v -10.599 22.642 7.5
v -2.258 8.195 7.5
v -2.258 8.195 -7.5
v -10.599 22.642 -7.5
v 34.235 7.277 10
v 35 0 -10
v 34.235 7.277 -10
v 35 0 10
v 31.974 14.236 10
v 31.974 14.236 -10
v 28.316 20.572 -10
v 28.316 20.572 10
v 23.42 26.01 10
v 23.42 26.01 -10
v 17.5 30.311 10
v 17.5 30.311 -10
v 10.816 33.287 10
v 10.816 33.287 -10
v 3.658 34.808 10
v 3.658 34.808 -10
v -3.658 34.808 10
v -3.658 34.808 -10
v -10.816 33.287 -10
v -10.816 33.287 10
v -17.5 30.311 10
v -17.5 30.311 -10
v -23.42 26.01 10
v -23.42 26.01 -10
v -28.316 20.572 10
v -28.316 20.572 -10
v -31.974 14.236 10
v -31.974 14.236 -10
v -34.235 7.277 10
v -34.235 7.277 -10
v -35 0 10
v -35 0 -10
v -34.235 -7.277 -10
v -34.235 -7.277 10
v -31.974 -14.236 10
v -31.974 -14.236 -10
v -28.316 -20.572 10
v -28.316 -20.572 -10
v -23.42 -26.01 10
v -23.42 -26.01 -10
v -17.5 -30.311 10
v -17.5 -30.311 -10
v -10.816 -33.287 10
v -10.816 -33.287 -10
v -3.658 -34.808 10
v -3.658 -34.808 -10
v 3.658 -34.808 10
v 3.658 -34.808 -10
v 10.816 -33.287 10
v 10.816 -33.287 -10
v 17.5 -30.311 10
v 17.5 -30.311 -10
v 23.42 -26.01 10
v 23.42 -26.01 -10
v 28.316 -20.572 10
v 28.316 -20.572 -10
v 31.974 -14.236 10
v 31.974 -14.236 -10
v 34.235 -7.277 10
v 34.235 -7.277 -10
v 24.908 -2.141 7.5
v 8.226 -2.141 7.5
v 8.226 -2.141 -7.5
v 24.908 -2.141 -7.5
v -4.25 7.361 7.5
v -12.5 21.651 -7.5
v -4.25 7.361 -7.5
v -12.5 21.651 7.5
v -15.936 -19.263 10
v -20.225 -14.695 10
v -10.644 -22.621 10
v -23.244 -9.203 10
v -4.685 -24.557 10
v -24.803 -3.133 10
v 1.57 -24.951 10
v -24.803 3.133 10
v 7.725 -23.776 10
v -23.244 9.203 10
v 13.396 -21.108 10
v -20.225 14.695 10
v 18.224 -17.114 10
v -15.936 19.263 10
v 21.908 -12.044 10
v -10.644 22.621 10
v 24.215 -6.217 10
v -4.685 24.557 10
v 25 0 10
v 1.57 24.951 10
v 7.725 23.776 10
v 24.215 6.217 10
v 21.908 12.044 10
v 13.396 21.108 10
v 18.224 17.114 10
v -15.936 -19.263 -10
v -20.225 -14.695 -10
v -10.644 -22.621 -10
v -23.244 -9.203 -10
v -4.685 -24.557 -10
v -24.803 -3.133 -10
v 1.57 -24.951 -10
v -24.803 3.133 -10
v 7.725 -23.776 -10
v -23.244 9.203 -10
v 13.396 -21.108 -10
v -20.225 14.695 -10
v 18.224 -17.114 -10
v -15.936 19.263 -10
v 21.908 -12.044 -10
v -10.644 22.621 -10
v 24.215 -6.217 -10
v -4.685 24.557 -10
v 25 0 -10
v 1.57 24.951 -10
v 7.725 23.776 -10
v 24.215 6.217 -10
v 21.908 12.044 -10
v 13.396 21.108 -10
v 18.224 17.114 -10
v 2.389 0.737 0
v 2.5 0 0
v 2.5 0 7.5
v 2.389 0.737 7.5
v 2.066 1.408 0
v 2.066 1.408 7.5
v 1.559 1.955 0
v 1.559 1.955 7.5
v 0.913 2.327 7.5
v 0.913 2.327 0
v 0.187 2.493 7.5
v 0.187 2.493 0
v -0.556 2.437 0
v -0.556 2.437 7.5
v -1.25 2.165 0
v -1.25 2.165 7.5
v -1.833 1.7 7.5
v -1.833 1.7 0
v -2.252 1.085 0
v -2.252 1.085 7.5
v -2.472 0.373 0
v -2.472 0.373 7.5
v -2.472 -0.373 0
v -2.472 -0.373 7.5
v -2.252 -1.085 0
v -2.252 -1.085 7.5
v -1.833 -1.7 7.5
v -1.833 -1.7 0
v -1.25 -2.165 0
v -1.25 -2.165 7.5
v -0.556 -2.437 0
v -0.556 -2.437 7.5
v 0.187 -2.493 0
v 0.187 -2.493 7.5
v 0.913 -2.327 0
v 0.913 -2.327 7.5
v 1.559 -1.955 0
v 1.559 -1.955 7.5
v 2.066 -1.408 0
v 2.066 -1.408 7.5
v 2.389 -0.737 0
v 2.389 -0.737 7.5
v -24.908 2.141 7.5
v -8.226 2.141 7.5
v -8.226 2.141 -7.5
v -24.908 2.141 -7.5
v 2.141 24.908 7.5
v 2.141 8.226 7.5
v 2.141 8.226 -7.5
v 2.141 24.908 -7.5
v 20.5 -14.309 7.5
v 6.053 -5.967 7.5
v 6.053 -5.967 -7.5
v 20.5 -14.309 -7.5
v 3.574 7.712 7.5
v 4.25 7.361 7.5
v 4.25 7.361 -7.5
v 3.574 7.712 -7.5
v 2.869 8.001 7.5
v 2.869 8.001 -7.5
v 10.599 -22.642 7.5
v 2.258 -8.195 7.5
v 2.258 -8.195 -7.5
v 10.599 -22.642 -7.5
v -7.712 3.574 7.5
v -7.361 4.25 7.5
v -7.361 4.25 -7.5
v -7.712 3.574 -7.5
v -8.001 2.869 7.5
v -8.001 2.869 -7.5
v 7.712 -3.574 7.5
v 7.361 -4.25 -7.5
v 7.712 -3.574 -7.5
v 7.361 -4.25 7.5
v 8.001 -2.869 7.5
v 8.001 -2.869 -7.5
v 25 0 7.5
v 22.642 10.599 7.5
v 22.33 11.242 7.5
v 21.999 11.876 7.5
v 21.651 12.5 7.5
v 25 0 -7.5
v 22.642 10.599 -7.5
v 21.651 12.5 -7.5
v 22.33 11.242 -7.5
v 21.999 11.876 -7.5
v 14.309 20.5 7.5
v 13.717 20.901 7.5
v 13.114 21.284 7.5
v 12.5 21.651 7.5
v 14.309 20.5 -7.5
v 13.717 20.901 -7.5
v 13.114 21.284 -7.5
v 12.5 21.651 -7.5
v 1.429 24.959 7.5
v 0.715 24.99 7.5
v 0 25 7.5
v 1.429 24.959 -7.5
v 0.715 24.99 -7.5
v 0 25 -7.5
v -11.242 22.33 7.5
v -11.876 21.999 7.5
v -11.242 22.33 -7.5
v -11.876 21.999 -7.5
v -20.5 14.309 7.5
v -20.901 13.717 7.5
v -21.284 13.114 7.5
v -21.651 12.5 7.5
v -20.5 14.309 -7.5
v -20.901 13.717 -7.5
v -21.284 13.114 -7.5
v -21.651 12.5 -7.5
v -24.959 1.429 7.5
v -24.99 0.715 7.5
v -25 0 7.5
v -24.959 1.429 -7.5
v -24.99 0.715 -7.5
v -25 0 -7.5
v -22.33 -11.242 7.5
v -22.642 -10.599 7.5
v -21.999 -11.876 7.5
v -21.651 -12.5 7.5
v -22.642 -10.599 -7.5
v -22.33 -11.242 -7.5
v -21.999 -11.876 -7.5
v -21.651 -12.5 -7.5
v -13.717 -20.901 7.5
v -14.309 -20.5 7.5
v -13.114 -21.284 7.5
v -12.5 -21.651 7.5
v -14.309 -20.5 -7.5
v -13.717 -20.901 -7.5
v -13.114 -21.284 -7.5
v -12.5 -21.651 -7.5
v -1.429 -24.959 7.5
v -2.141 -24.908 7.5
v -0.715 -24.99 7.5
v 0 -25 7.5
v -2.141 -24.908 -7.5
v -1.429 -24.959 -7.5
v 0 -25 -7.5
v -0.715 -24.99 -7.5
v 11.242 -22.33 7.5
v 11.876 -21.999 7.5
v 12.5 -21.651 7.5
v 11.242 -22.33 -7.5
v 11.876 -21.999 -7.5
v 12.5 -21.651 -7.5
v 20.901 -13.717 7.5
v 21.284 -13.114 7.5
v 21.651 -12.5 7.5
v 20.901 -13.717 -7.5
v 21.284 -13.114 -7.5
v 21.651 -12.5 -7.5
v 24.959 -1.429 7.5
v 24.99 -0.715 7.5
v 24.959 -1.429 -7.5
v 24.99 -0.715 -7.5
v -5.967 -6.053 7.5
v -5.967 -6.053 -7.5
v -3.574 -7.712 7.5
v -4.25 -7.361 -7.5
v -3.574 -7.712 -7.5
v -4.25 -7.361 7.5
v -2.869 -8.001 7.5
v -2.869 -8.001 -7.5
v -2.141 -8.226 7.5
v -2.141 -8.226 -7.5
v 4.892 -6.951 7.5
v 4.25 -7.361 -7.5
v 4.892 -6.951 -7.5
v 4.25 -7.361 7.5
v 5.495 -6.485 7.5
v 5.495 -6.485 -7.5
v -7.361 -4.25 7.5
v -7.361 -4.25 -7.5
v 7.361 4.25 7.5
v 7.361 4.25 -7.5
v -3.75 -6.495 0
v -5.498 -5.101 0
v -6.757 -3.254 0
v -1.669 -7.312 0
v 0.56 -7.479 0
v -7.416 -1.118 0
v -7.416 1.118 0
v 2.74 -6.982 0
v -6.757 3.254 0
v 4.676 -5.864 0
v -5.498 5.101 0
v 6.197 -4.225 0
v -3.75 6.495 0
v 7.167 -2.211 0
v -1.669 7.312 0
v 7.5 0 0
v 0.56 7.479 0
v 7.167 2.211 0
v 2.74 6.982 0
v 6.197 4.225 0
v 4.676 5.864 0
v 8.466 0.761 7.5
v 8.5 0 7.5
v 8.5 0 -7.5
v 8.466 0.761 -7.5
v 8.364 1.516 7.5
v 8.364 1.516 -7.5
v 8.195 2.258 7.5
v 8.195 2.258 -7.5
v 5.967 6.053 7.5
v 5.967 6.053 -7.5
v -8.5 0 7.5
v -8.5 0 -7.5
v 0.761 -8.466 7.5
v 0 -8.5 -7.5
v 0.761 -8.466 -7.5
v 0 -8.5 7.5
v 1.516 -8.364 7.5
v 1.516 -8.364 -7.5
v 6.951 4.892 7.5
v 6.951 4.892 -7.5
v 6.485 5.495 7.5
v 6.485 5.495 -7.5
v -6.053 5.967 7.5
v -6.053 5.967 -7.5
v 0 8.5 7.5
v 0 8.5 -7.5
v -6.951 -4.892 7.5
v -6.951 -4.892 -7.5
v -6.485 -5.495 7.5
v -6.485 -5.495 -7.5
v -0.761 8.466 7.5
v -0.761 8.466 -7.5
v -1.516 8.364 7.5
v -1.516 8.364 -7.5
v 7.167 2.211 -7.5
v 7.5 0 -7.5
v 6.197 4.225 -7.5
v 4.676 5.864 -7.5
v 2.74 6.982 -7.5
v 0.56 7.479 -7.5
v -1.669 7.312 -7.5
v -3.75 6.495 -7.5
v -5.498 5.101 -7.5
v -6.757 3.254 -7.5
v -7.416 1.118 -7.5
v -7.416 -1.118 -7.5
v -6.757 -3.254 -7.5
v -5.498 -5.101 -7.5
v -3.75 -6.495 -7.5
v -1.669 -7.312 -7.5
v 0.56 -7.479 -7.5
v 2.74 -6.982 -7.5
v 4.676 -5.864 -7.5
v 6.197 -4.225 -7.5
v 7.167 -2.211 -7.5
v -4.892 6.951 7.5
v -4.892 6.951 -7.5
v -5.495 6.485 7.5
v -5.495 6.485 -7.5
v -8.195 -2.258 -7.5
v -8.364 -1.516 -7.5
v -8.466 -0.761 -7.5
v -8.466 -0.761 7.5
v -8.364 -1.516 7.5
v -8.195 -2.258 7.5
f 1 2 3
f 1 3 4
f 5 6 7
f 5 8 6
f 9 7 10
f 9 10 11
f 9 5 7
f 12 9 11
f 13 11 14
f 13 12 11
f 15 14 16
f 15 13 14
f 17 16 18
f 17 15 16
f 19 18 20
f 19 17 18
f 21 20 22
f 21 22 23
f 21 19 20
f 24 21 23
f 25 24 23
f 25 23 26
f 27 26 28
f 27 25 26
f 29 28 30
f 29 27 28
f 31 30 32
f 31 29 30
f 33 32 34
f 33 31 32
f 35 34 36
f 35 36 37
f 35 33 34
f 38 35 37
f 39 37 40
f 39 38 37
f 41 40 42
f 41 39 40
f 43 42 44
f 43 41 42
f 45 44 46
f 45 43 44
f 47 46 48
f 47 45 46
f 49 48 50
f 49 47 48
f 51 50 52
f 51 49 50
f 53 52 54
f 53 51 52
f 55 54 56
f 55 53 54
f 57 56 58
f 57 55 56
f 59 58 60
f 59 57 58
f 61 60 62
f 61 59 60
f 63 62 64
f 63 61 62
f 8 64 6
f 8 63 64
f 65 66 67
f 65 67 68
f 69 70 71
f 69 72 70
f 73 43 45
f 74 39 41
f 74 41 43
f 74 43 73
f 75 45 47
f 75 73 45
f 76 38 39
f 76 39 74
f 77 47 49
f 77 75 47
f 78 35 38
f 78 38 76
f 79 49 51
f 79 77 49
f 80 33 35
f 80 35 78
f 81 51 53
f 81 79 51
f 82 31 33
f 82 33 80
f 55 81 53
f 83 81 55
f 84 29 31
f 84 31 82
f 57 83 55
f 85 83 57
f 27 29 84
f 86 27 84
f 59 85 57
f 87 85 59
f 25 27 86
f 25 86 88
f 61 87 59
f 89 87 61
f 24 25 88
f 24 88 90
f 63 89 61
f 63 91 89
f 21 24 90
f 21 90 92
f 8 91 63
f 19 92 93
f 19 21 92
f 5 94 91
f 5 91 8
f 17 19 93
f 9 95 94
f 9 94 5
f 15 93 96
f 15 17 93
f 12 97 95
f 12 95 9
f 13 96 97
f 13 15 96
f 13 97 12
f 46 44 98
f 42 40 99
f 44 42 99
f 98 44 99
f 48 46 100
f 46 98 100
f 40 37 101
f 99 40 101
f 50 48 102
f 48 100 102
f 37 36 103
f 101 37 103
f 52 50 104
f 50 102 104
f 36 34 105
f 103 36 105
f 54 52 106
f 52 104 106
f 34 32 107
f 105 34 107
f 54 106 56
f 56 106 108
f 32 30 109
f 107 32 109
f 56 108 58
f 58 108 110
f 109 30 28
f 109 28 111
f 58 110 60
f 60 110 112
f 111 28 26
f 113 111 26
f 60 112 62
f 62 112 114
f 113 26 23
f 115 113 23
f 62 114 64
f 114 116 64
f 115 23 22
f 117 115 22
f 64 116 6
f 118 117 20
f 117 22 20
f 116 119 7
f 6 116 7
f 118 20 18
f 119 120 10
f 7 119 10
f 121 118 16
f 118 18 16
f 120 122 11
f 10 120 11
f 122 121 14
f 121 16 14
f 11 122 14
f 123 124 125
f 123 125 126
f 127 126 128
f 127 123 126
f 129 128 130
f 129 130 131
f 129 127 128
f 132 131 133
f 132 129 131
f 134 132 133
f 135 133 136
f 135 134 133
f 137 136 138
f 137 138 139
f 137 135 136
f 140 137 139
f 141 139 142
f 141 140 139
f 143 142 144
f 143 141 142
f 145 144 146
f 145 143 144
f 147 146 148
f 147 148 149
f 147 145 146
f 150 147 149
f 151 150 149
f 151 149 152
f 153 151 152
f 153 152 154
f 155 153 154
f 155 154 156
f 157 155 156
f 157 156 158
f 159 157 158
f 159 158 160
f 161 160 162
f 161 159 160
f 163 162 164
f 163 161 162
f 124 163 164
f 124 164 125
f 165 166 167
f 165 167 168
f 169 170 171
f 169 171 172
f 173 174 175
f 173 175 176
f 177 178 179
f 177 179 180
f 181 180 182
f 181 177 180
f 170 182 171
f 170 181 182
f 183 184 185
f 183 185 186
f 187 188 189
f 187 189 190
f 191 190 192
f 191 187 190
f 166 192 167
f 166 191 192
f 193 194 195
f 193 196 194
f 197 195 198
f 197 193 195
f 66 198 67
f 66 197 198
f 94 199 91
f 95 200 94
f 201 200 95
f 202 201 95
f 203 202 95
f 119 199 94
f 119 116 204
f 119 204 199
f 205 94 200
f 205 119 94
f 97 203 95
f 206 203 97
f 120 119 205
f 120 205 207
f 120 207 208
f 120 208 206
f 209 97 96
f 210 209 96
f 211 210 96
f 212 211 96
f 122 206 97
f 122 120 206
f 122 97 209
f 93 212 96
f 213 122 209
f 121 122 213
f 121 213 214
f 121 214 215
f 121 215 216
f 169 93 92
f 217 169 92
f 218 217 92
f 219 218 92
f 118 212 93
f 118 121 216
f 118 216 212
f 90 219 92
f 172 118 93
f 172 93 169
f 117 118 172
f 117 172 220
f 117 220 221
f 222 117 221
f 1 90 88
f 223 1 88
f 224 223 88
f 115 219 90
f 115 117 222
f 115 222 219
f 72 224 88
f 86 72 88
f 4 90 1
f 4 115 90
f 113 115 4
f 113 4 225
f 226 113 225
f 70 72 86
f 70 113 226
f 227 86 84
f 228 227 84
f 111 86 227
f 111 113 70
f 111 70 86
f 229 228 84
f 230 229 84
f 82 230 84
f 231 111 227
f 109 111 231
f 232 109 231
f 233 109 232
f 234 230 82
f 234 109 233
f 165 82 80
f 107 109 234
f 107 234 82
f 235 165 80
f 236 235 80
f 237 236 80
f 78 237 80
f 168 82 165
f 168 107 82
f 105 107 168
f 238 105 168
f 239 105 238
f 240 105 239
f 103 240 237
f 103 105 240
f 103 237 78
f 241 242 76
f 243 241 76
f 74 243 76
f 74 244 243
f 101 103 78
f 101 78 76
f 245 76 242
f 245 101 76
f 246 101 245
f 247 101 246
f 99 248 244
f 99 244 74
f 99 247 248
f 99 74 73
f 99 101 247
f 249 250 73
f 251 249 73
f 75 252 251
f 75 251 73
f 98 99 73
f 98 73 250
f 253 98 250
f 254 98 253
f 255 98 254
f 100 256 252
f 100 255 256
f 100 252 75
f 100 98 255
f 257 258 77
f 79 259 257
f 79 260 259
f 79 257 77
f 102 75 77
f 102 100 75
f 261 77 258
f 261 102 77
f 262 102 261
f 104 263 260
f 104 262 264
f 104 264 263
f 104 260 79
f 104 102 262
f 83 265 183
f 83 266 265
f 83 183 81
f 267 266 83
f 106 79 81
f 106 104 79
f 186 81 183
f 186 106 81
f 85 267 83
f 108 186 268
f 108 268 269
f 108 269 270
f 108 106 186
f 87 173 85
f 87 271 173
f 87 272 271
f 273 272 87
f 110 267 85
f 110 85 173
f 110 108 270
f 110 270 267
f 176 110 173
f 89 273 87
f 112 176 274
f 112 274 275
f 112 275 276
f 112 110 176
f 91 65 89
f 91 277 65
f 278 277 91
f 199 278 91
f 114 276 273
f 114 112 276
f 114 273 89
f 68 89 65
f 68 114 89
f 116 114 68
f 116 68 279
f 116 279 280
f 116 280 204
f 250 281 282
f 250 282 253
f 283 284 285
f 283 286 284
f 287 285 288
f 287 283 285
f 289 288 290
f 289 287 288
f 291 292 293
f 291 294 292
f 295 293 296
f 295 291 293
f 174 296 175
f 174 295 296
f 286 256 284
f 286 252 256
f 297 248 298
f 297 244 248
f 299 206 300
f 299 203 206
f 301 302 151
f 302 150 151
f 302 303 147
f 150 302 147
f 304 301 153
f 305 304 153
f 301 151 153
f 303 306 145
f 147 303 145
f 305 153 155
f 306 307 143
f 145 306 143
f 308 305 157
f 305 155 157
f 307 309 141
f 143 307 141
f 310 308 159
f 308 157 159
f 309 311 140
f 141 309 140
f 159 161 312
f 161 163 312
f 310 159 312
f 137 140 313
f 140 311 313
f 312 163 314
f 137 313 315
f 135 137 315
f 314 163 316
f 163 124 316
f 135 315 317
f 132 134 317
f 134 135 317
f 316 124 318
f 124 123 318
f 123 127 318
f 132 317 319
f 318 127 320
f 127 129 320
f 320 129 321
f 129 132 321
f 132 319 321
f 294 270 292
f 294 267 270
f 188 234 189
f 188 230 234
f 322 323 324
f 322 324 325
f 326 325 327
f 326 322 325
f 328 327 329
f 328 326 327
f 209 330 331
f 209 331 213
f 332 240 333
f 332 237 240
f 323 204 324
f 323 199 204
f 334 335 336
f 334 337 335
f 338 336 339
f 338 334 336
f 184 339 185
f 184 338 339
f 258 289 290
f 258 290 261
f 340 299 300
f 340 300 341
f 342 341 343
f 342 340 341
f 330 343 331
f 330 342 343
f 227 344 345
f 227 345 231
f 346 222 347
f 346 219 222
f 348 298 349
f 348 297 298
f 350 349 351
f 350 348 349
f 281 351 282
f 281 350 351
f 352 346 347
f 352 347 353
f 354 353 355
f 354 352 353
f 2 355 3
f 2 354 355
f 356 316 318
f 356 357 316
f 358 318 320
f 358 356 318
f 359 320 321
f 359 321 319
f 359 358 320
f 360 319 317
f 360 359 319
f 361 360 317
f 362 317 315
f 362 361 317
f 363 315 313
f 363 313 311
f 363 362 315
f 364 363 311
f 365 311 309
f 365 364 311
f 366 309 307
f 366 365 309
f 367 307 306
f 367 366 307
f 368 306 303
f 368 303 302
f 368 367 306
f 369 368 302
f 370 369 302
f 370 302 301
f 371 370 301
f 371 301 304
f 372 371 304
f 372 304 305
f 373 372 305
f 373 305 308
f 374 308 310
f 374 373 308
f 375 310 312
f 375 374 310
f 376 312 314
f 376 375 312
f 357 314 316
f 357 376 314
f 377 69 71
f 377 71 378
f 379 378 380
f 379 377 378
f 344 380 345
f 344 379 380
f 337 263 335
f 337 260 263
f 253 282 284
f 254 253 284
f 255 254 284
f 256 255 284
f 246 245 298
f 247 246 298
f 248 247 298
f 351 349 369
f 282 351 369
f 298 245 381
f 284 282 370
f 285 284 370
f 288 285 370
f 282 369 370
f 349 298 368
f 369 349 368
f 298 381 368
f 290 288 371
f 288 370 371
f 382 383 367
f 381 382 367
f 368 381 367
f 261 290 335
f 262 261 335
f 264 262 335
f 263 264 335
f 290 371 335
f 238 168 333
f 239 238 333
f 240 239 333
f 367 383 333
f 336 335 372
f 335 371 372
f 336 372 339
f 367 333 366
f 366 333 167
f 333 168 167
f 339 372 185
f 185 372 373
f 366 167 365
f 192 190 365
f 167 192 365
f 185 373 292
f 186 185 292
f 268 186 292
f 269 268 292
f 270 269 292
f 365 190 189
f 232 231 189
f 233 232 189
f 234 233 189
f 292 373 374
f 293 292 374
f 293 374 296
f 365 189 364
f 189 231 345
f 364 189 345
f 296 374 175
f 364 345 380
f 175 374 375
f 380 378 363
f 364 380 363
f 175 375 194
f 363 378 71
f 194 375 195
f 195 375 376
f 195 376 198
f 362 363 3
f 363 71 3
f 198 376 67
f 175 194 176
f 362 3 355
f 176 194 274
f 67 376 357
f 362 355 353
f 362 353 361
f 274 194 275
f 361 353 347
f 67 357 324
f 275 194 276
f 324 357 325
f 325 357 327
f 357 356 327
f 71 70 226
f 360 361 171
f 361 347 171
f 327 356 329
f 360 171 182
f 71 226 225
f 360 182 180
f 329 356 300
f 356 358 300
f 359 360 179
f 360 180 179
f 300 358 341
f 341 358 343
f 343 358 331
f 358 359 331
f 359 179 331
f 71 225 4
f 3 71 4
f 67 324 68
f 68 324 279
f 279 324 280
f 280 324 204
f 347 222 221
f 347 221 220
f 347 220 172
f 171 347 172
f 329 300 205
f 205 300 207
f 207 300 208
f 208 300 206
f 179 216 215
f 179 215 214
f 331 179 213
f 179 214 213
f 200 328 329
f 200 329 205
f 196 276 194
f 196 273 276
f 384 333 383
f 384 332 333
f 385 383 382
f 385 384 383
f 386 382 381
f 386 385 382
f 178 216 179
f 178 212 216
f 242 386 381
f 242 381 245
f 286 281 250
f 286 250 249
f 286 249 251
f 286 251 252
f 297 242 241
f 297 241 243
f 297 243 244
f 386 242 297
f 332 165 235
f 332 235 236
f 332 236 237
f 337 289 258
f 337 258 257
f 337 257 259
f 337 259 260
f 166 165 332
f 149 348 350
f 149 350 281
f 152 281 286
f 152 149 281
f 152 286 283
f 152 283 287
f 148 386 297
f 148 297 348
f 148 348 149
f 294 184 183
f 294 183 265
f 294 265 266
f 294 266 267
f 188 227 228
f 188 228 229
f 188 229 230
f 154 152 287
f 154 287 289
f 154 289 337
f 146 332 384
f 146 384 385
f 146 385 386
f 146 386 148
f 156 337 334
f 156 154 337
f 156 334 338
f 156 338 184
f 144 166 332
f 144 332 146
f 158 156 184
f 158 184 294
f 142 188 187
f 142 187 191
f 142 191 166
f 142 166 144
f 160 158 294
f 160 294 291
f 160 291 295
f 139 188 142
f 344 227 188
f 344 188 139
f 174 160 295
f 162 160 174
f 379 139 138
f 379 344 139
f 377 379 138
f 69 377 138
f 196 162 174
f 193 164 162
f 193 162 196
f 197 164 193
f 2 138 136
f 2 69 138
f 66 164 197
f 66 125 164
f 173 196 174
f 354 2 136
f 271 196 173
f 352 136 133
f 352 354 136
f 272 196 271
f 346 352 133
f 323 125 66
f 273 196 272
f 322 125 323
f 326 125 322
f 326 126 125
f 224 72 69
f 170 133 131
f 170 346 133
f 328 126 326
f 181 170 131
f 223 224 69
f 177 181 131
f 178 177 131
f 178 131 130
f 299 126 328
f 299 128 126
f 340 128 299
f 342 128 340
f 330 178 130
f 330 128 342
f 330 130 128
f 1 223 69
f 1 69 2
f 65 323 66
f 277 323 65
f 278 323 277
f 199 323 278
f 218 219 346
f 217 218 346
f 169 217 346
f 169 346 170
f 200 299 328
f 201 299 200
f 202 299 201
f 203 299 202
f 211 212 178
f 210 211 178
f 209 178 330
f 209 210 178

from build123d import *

# Parameters (mm, degrees)
BOSS_EXTRUDE1_DEPTH    = 7.5
BOSS_EXTRUDE1_2_DEPTH  = 7.5
BOSS_EXTRUDE1_3_DEPTH  = 7.5
BOSS_EXTRUDE1_4_DEPTH  = 7.5
BOSS_EXTRUDE1_5_DEPTH  = 7.5
BOSS_EXTRUDE1_6_DEPTH  = 7.5
BOSS_EXTRUDE1_7_DEPTH  = 7.5
BOSS_EXTRUDE1_8_DEPTH  = 7.5
BOSS_EXTRUDE1_9_DEPTH  = 7.5
BOSS_EXTRUDE1_10_DEPTH = 7.5
BOSS_EXTRUDE1_11_DEPTH = 7.5
BOSS_EXTRUDE1_12_DEPTH = 7.5
SKETCH1_3_R            = 27
SKETCH1_3_R_2          = 25
BOSS_EXTRUDE2_DEPTH    = 10
SKETCH1_4_R            = 8.5
SKETCH1_4_R_2          = 7.5
BOSS_EXTRUDE3_DEPTH    = 7.5
SKETCH1_5_R            = 35
SKETCH1_5_R_2          = 27
BOSS_EXTRUDE4_DEPTH    = 10
SKETCH1_6_R            = 7.5
SKETCH1_6_R_2          = 2.5
BOSS_EXTRUDE5_DEPTH    = 7.5


with BuildPart() as part:
    # Sketch1 → Boss-Extrude1 (new, symmetric)
    with BuildSketch(Plane.XY):
        with BuildLine():
            Line((-25, 0), (-8.5, 0))
            ThreePointArc((-8.5, 0), (-8.43117662, 1.079472466), (-8.225820987, 2.141464239))
            Line((-8.225820987, 2.141464239), (-24.908113757, 2.141464239))
            ThreePointArc((-24.908113757, 2.141464239), (-24.977017876, 1.071717333), (-25, 0))
        make_face()
    extrude(amount=BOSS_EXTRUDE1_DEPTH, both=True)



with BuildPart() as body_2:
    # Sketch1 → Boss-Extrude1 2 (new, symmetric)
    with BuildSketch(Plane.XY):
        with BuildLine():
            ThreePointArc((-7.361215932, -4.25), (-7.84134937, -3.280737732), (-8.194502061, -2.258348061))
            Line((-8.194502061, -2.258348061), (-22.641791393, -10.599494446))
            ThreePointArc((-22.641791393, -10.599494446), (-22.166590658, -11.560374502), (-21.650635095, -12.5))
            Line((-21.650635095, -12.5), (-7.361215932, -4.25))
        make_face()
    extrude(amount=BOSS_EXTRUDE1_2_DEPTH, both=True)


with BuildPart() as body_3:
    # Sketch1 → Boss-Extrude1 3 (new, symmetric)
    with BuildSketch(Plane.XY):
        with BuildLine():
            Line((-21.650635095, 12.5), (-7.361215932, 4.25))
            ThreePointArc((-7.361215932, 4.25), (-6.761876904, 5.150438888), (-6.053037822, 5.967472926))
            Line((-6.053037822, 5.967472926), (-20.500327154, 14.308619311))
            ThreePointArc((-20.500327154, 14.308619311), (-21.094873324, 13.416643374), (-21.650635095, 12.5))
        make_face()
    extrude(amount=BOSS_EXTRUDE1_3_DEPTH, both=True)


with BuildPart() as body_4:
    # Sketch1 → Boss-Extrude1 4 (new, symmetric)
    with BuildSketch(Plane.XY):
        with BuildLine():
            ThreePointArc((-4.25, -7.361215932), (-5.150438888, -6.761876904), (-5.967472926, -6.053037822))
            Line((-5.967472926, -6.053037822), (-14.308619311, -20.500327154))
            ThreePointArc((-14.308619311, -20.500327154), (-13.416643374, -21.094873324), (-12.5, -21.650635095))
            Line((-12.5, -21.650635095), (-4.25, -7.361215932))
        make_face()
    extrude(amount=BOSS_EXTRUDE1_4_DEPTH, both=True)


with BuildPart() as body_5:
    # Sketch1 → Boss-Extrude1 5 (new, symmetric)
    with BuildSketch(Plane.XY):
        with BuildLine():
            Line((-12.5, 21.650635095), (-4.25, 7.361215932))
            ThreePointArc((-4.25, 7.361215932), (-3.280737732, 7.84134937), (-2.258348061, 8.194502061))
            Line((-2.258348061, 8.194502061), (-10.599494446, 22.641791393))
            ThreePointArc((-10.599494446, 22.641791393), (-11.560374502, 22.166590658), (-12.5, 21.650635095))
        make_face()
    extrude(amount=BOSS_EXTRUDE1_5_DEPTH, both=True)


with BuildPart() as body_6:
    # Sketch1 → Boss-Extrude1 6 (new, symmetric)
    with BuildSketch(Plane.XY):
        with BuildLine():
            ThreePointArc((0, -8.5), (-1.079472466, -8.43117662), (-2.141464239, -8.225820987))
            Line((-2.141464239, -8.225820987), (-2.141464239, -24.908113757))
            ThreePointArc((-2.141464239, -24.908113757), (-1.071717333, -24.977017876), (0, -25))
            Line((0, -25), (0, -8.5))
        make_face()
    extrude(amount=BOSS_EXTRUDE1_6_DEPTH, both=True)


with BuildPart() as body_7:
    # Sketch1 → Boss-Extrude1 7 (new, symmetric)
    with BuildSketch(Plane.XY):
        with BuildLine():
            Line((0, 25), (0, 8.5))
            ThreePointArc((0, 8.5), (1.079472466, 8.43117662), (2.141464239, 8.225820987))
            Line((2.141464239, 8.225820987), (2.141464239, 24.908113757))
            ThreePointArc((2.141464239, 24.908113757), (1.071717333, 24.977017876), (0, 25))
        make_face()
    extrude(amount=BOSS_EXTRUDE1_7_DEPTH, both=True)


with BuildPart() as body_8:
    # Sketch1 → Boss-Extrude1 8 (new, symmetric)
    with BuildSketch(Plane.XY):
        with BuildLine():
            ThreePointArc((4.25, -7.361215932), (3.280737732, -7.84134937), (2.258348061, -8.194502061))
            Line((2.258348061, -8.194502061), (10.599494446, -22.641791393))
            ThreePointArc((10.599494446, -22.641791393), (11.560374502, -22.166590658), (12.5, -21.650635095))
            Line((12.5, -21.650635095), (4.25, -7.361215932))
        make_face()
    extrude(amount=BOSS_EXTRUDE1_8_DEPTH, both=True)


with BuildPart() as body_9:
    # Sketch1 → Boss-Extrude1 9 (new, symmetric)
    with BuildSketch(Plane.XY):
        with BuildLine():
            Line((12.5, 21.650635095), (4.25, 7.361215932))
            ThreePointArc((4.25, 7.361215932), (5.150438888, 6.761876904), (5.967472926, 6.053037822))
            Line((5.967472926, 6.053037822), (14.308619311, 20.500327154))
            ThreePointArc((14.308619311, 20.500327154), (13.416643374, 21.094873324), (12.5, 21.650635095))
        make_face()
    extrude(amount=BOSS_EXTRUDE1_9_DEPTH, both=True)


with BuildPart() as body_10:
    # Sketch1 → Boss-Extrude1 10 (new, symmetric)
    with BuildSketch(Plane.XY):
        with BuildLine():
            ThreePointArc((7.361215932, -4.25), (6.761876904, -5.150438888), (6.053037822, -5.967472926))
            Line((6.053037822, -5.967472926), (20.500327154, -14.308619311))
            ThreePointArc((20.500327154, -14.308619311), (21.094873324, -13.416643374), (21.650635095, -12.5))
            Line((21.650635095, -12.5), (7.361215932, -4.25))
        make_face()
    extrude(amount=BOSS_EXTRUDE1_10_DEPTH, both=True)


with BuildPart() as body_11:
    # Sketch1 → Boss-Extrude1 11 (new, symmetric)
    with BuildSketch(Plane.XY):
        with BuildLine():
            Line((21.650635095, 12.5), (7.361215932, 4.25))
            ThreePointArc((7.361215932, 4.25), (7.84134937, 3.280737732), (8.194502061, 2.258348061))
            Line((8.194502061, 2.258348061), (22.641791393, 10.599494446))
            ThreePointArc((22.641791393, 10.599494446), (22.166590658, 11.560374502), (21.650635095, 12.5))
        make_face()
    extrude(amount=BOSS_EXTRUDE1_11_DEPTH, both=True)


with BuildPart() as body_12:
    # Sketch1 → Boss-Extrude1 12 (new, symmetric)
    with BuildSketch(Plane.XY):
        with BuildLine():
            ThreePointArc((8.5, 0), (8.43117662, -1.079472466), (8.225820987, -2.141464239))
            Line((8.225820987, -2.141464239), (24.908113757, -2.141464239))
            ThreePointArc((24.908113757, -2.141464239), (24.977017876, -1.071717333), (25, 0))
            Line((25, 0), (8.5, 0))
        make_face()
    extrude(amount=BOSS_EXTRUDE1_12_DEPTH, both=True)


with BuildPart() as part_1:
    add(part.part)

    add(body_2.part)  # Boss-Extrude2 merges body 2

    add(body_3.part)  # Boss-Extrude2 merges body 3

    add(body_4.part)  # Boss-Extrude2 merges body 4

    add(body_5.part)  # Boss-Extrude2 merges body 5

    add(body_6.part)  # Boss-Extrude2 merges body 6

    add(body_7.part)  # Boss-Extrude2 merges body 7

    add(body_8.part)  # Boss-Extrude2 merges body 8

    add(body_9.part)  # Boss-Extrude2 merges body 9

    add(body_10.part)  # Boss-Extrude2 merges body 10

    add(body_11.part)  # Boss-Extrude2 merges body 11

    add(body_12.part)  # Boss-Extrude2 merges body 12
    # Sketch1_3 → Boss-Extrude2 (add, symmetric)
    with BuildSketch(Plane.XY):
        Circle(SKETCH1_3_R)
        Circle(SKETCH1_3_R_2, mode=Mode.SUBTRACT)
    extrude(amount=BOSS_EXTRUDE2_DEPTH, both=True)

    # Sketch1_4 → Boss-Extrude3 (add, symmetric)
    with BuildSketch(Plane.XY):
        Circle(SKETCH1_4_R)
        Circle(SKETCH1_4_R_2, mode=Mode.SUBTRACT)
    extrude(amount=BOSS_EXTRUDE3_DEPTH, both=True)

    # Sketch1_5 → Boss-Extrude4 (add, symmetric)
    with BuildSketch(Plane.XY):
        Circle(SKETCH1_5_R)
        Circle(SKETCH1_5_R_2, mode=Mode.SUBTRACT)
    extrude(amount=BOSS_EXTRUDE4_DEPTH, both=True)

    # Sketch1_6 → Boss-Extrude5 (add)
    with BuildSketch(Plane.XY):
        Circle(SKETCH1_6_R)
        Circle(SKETCH1_6_R_2, mode=Mode.SUBTRACT)
    extrude(amount=BOSS_EXTRUDE5_DEPTH)


solid = part_1.part
